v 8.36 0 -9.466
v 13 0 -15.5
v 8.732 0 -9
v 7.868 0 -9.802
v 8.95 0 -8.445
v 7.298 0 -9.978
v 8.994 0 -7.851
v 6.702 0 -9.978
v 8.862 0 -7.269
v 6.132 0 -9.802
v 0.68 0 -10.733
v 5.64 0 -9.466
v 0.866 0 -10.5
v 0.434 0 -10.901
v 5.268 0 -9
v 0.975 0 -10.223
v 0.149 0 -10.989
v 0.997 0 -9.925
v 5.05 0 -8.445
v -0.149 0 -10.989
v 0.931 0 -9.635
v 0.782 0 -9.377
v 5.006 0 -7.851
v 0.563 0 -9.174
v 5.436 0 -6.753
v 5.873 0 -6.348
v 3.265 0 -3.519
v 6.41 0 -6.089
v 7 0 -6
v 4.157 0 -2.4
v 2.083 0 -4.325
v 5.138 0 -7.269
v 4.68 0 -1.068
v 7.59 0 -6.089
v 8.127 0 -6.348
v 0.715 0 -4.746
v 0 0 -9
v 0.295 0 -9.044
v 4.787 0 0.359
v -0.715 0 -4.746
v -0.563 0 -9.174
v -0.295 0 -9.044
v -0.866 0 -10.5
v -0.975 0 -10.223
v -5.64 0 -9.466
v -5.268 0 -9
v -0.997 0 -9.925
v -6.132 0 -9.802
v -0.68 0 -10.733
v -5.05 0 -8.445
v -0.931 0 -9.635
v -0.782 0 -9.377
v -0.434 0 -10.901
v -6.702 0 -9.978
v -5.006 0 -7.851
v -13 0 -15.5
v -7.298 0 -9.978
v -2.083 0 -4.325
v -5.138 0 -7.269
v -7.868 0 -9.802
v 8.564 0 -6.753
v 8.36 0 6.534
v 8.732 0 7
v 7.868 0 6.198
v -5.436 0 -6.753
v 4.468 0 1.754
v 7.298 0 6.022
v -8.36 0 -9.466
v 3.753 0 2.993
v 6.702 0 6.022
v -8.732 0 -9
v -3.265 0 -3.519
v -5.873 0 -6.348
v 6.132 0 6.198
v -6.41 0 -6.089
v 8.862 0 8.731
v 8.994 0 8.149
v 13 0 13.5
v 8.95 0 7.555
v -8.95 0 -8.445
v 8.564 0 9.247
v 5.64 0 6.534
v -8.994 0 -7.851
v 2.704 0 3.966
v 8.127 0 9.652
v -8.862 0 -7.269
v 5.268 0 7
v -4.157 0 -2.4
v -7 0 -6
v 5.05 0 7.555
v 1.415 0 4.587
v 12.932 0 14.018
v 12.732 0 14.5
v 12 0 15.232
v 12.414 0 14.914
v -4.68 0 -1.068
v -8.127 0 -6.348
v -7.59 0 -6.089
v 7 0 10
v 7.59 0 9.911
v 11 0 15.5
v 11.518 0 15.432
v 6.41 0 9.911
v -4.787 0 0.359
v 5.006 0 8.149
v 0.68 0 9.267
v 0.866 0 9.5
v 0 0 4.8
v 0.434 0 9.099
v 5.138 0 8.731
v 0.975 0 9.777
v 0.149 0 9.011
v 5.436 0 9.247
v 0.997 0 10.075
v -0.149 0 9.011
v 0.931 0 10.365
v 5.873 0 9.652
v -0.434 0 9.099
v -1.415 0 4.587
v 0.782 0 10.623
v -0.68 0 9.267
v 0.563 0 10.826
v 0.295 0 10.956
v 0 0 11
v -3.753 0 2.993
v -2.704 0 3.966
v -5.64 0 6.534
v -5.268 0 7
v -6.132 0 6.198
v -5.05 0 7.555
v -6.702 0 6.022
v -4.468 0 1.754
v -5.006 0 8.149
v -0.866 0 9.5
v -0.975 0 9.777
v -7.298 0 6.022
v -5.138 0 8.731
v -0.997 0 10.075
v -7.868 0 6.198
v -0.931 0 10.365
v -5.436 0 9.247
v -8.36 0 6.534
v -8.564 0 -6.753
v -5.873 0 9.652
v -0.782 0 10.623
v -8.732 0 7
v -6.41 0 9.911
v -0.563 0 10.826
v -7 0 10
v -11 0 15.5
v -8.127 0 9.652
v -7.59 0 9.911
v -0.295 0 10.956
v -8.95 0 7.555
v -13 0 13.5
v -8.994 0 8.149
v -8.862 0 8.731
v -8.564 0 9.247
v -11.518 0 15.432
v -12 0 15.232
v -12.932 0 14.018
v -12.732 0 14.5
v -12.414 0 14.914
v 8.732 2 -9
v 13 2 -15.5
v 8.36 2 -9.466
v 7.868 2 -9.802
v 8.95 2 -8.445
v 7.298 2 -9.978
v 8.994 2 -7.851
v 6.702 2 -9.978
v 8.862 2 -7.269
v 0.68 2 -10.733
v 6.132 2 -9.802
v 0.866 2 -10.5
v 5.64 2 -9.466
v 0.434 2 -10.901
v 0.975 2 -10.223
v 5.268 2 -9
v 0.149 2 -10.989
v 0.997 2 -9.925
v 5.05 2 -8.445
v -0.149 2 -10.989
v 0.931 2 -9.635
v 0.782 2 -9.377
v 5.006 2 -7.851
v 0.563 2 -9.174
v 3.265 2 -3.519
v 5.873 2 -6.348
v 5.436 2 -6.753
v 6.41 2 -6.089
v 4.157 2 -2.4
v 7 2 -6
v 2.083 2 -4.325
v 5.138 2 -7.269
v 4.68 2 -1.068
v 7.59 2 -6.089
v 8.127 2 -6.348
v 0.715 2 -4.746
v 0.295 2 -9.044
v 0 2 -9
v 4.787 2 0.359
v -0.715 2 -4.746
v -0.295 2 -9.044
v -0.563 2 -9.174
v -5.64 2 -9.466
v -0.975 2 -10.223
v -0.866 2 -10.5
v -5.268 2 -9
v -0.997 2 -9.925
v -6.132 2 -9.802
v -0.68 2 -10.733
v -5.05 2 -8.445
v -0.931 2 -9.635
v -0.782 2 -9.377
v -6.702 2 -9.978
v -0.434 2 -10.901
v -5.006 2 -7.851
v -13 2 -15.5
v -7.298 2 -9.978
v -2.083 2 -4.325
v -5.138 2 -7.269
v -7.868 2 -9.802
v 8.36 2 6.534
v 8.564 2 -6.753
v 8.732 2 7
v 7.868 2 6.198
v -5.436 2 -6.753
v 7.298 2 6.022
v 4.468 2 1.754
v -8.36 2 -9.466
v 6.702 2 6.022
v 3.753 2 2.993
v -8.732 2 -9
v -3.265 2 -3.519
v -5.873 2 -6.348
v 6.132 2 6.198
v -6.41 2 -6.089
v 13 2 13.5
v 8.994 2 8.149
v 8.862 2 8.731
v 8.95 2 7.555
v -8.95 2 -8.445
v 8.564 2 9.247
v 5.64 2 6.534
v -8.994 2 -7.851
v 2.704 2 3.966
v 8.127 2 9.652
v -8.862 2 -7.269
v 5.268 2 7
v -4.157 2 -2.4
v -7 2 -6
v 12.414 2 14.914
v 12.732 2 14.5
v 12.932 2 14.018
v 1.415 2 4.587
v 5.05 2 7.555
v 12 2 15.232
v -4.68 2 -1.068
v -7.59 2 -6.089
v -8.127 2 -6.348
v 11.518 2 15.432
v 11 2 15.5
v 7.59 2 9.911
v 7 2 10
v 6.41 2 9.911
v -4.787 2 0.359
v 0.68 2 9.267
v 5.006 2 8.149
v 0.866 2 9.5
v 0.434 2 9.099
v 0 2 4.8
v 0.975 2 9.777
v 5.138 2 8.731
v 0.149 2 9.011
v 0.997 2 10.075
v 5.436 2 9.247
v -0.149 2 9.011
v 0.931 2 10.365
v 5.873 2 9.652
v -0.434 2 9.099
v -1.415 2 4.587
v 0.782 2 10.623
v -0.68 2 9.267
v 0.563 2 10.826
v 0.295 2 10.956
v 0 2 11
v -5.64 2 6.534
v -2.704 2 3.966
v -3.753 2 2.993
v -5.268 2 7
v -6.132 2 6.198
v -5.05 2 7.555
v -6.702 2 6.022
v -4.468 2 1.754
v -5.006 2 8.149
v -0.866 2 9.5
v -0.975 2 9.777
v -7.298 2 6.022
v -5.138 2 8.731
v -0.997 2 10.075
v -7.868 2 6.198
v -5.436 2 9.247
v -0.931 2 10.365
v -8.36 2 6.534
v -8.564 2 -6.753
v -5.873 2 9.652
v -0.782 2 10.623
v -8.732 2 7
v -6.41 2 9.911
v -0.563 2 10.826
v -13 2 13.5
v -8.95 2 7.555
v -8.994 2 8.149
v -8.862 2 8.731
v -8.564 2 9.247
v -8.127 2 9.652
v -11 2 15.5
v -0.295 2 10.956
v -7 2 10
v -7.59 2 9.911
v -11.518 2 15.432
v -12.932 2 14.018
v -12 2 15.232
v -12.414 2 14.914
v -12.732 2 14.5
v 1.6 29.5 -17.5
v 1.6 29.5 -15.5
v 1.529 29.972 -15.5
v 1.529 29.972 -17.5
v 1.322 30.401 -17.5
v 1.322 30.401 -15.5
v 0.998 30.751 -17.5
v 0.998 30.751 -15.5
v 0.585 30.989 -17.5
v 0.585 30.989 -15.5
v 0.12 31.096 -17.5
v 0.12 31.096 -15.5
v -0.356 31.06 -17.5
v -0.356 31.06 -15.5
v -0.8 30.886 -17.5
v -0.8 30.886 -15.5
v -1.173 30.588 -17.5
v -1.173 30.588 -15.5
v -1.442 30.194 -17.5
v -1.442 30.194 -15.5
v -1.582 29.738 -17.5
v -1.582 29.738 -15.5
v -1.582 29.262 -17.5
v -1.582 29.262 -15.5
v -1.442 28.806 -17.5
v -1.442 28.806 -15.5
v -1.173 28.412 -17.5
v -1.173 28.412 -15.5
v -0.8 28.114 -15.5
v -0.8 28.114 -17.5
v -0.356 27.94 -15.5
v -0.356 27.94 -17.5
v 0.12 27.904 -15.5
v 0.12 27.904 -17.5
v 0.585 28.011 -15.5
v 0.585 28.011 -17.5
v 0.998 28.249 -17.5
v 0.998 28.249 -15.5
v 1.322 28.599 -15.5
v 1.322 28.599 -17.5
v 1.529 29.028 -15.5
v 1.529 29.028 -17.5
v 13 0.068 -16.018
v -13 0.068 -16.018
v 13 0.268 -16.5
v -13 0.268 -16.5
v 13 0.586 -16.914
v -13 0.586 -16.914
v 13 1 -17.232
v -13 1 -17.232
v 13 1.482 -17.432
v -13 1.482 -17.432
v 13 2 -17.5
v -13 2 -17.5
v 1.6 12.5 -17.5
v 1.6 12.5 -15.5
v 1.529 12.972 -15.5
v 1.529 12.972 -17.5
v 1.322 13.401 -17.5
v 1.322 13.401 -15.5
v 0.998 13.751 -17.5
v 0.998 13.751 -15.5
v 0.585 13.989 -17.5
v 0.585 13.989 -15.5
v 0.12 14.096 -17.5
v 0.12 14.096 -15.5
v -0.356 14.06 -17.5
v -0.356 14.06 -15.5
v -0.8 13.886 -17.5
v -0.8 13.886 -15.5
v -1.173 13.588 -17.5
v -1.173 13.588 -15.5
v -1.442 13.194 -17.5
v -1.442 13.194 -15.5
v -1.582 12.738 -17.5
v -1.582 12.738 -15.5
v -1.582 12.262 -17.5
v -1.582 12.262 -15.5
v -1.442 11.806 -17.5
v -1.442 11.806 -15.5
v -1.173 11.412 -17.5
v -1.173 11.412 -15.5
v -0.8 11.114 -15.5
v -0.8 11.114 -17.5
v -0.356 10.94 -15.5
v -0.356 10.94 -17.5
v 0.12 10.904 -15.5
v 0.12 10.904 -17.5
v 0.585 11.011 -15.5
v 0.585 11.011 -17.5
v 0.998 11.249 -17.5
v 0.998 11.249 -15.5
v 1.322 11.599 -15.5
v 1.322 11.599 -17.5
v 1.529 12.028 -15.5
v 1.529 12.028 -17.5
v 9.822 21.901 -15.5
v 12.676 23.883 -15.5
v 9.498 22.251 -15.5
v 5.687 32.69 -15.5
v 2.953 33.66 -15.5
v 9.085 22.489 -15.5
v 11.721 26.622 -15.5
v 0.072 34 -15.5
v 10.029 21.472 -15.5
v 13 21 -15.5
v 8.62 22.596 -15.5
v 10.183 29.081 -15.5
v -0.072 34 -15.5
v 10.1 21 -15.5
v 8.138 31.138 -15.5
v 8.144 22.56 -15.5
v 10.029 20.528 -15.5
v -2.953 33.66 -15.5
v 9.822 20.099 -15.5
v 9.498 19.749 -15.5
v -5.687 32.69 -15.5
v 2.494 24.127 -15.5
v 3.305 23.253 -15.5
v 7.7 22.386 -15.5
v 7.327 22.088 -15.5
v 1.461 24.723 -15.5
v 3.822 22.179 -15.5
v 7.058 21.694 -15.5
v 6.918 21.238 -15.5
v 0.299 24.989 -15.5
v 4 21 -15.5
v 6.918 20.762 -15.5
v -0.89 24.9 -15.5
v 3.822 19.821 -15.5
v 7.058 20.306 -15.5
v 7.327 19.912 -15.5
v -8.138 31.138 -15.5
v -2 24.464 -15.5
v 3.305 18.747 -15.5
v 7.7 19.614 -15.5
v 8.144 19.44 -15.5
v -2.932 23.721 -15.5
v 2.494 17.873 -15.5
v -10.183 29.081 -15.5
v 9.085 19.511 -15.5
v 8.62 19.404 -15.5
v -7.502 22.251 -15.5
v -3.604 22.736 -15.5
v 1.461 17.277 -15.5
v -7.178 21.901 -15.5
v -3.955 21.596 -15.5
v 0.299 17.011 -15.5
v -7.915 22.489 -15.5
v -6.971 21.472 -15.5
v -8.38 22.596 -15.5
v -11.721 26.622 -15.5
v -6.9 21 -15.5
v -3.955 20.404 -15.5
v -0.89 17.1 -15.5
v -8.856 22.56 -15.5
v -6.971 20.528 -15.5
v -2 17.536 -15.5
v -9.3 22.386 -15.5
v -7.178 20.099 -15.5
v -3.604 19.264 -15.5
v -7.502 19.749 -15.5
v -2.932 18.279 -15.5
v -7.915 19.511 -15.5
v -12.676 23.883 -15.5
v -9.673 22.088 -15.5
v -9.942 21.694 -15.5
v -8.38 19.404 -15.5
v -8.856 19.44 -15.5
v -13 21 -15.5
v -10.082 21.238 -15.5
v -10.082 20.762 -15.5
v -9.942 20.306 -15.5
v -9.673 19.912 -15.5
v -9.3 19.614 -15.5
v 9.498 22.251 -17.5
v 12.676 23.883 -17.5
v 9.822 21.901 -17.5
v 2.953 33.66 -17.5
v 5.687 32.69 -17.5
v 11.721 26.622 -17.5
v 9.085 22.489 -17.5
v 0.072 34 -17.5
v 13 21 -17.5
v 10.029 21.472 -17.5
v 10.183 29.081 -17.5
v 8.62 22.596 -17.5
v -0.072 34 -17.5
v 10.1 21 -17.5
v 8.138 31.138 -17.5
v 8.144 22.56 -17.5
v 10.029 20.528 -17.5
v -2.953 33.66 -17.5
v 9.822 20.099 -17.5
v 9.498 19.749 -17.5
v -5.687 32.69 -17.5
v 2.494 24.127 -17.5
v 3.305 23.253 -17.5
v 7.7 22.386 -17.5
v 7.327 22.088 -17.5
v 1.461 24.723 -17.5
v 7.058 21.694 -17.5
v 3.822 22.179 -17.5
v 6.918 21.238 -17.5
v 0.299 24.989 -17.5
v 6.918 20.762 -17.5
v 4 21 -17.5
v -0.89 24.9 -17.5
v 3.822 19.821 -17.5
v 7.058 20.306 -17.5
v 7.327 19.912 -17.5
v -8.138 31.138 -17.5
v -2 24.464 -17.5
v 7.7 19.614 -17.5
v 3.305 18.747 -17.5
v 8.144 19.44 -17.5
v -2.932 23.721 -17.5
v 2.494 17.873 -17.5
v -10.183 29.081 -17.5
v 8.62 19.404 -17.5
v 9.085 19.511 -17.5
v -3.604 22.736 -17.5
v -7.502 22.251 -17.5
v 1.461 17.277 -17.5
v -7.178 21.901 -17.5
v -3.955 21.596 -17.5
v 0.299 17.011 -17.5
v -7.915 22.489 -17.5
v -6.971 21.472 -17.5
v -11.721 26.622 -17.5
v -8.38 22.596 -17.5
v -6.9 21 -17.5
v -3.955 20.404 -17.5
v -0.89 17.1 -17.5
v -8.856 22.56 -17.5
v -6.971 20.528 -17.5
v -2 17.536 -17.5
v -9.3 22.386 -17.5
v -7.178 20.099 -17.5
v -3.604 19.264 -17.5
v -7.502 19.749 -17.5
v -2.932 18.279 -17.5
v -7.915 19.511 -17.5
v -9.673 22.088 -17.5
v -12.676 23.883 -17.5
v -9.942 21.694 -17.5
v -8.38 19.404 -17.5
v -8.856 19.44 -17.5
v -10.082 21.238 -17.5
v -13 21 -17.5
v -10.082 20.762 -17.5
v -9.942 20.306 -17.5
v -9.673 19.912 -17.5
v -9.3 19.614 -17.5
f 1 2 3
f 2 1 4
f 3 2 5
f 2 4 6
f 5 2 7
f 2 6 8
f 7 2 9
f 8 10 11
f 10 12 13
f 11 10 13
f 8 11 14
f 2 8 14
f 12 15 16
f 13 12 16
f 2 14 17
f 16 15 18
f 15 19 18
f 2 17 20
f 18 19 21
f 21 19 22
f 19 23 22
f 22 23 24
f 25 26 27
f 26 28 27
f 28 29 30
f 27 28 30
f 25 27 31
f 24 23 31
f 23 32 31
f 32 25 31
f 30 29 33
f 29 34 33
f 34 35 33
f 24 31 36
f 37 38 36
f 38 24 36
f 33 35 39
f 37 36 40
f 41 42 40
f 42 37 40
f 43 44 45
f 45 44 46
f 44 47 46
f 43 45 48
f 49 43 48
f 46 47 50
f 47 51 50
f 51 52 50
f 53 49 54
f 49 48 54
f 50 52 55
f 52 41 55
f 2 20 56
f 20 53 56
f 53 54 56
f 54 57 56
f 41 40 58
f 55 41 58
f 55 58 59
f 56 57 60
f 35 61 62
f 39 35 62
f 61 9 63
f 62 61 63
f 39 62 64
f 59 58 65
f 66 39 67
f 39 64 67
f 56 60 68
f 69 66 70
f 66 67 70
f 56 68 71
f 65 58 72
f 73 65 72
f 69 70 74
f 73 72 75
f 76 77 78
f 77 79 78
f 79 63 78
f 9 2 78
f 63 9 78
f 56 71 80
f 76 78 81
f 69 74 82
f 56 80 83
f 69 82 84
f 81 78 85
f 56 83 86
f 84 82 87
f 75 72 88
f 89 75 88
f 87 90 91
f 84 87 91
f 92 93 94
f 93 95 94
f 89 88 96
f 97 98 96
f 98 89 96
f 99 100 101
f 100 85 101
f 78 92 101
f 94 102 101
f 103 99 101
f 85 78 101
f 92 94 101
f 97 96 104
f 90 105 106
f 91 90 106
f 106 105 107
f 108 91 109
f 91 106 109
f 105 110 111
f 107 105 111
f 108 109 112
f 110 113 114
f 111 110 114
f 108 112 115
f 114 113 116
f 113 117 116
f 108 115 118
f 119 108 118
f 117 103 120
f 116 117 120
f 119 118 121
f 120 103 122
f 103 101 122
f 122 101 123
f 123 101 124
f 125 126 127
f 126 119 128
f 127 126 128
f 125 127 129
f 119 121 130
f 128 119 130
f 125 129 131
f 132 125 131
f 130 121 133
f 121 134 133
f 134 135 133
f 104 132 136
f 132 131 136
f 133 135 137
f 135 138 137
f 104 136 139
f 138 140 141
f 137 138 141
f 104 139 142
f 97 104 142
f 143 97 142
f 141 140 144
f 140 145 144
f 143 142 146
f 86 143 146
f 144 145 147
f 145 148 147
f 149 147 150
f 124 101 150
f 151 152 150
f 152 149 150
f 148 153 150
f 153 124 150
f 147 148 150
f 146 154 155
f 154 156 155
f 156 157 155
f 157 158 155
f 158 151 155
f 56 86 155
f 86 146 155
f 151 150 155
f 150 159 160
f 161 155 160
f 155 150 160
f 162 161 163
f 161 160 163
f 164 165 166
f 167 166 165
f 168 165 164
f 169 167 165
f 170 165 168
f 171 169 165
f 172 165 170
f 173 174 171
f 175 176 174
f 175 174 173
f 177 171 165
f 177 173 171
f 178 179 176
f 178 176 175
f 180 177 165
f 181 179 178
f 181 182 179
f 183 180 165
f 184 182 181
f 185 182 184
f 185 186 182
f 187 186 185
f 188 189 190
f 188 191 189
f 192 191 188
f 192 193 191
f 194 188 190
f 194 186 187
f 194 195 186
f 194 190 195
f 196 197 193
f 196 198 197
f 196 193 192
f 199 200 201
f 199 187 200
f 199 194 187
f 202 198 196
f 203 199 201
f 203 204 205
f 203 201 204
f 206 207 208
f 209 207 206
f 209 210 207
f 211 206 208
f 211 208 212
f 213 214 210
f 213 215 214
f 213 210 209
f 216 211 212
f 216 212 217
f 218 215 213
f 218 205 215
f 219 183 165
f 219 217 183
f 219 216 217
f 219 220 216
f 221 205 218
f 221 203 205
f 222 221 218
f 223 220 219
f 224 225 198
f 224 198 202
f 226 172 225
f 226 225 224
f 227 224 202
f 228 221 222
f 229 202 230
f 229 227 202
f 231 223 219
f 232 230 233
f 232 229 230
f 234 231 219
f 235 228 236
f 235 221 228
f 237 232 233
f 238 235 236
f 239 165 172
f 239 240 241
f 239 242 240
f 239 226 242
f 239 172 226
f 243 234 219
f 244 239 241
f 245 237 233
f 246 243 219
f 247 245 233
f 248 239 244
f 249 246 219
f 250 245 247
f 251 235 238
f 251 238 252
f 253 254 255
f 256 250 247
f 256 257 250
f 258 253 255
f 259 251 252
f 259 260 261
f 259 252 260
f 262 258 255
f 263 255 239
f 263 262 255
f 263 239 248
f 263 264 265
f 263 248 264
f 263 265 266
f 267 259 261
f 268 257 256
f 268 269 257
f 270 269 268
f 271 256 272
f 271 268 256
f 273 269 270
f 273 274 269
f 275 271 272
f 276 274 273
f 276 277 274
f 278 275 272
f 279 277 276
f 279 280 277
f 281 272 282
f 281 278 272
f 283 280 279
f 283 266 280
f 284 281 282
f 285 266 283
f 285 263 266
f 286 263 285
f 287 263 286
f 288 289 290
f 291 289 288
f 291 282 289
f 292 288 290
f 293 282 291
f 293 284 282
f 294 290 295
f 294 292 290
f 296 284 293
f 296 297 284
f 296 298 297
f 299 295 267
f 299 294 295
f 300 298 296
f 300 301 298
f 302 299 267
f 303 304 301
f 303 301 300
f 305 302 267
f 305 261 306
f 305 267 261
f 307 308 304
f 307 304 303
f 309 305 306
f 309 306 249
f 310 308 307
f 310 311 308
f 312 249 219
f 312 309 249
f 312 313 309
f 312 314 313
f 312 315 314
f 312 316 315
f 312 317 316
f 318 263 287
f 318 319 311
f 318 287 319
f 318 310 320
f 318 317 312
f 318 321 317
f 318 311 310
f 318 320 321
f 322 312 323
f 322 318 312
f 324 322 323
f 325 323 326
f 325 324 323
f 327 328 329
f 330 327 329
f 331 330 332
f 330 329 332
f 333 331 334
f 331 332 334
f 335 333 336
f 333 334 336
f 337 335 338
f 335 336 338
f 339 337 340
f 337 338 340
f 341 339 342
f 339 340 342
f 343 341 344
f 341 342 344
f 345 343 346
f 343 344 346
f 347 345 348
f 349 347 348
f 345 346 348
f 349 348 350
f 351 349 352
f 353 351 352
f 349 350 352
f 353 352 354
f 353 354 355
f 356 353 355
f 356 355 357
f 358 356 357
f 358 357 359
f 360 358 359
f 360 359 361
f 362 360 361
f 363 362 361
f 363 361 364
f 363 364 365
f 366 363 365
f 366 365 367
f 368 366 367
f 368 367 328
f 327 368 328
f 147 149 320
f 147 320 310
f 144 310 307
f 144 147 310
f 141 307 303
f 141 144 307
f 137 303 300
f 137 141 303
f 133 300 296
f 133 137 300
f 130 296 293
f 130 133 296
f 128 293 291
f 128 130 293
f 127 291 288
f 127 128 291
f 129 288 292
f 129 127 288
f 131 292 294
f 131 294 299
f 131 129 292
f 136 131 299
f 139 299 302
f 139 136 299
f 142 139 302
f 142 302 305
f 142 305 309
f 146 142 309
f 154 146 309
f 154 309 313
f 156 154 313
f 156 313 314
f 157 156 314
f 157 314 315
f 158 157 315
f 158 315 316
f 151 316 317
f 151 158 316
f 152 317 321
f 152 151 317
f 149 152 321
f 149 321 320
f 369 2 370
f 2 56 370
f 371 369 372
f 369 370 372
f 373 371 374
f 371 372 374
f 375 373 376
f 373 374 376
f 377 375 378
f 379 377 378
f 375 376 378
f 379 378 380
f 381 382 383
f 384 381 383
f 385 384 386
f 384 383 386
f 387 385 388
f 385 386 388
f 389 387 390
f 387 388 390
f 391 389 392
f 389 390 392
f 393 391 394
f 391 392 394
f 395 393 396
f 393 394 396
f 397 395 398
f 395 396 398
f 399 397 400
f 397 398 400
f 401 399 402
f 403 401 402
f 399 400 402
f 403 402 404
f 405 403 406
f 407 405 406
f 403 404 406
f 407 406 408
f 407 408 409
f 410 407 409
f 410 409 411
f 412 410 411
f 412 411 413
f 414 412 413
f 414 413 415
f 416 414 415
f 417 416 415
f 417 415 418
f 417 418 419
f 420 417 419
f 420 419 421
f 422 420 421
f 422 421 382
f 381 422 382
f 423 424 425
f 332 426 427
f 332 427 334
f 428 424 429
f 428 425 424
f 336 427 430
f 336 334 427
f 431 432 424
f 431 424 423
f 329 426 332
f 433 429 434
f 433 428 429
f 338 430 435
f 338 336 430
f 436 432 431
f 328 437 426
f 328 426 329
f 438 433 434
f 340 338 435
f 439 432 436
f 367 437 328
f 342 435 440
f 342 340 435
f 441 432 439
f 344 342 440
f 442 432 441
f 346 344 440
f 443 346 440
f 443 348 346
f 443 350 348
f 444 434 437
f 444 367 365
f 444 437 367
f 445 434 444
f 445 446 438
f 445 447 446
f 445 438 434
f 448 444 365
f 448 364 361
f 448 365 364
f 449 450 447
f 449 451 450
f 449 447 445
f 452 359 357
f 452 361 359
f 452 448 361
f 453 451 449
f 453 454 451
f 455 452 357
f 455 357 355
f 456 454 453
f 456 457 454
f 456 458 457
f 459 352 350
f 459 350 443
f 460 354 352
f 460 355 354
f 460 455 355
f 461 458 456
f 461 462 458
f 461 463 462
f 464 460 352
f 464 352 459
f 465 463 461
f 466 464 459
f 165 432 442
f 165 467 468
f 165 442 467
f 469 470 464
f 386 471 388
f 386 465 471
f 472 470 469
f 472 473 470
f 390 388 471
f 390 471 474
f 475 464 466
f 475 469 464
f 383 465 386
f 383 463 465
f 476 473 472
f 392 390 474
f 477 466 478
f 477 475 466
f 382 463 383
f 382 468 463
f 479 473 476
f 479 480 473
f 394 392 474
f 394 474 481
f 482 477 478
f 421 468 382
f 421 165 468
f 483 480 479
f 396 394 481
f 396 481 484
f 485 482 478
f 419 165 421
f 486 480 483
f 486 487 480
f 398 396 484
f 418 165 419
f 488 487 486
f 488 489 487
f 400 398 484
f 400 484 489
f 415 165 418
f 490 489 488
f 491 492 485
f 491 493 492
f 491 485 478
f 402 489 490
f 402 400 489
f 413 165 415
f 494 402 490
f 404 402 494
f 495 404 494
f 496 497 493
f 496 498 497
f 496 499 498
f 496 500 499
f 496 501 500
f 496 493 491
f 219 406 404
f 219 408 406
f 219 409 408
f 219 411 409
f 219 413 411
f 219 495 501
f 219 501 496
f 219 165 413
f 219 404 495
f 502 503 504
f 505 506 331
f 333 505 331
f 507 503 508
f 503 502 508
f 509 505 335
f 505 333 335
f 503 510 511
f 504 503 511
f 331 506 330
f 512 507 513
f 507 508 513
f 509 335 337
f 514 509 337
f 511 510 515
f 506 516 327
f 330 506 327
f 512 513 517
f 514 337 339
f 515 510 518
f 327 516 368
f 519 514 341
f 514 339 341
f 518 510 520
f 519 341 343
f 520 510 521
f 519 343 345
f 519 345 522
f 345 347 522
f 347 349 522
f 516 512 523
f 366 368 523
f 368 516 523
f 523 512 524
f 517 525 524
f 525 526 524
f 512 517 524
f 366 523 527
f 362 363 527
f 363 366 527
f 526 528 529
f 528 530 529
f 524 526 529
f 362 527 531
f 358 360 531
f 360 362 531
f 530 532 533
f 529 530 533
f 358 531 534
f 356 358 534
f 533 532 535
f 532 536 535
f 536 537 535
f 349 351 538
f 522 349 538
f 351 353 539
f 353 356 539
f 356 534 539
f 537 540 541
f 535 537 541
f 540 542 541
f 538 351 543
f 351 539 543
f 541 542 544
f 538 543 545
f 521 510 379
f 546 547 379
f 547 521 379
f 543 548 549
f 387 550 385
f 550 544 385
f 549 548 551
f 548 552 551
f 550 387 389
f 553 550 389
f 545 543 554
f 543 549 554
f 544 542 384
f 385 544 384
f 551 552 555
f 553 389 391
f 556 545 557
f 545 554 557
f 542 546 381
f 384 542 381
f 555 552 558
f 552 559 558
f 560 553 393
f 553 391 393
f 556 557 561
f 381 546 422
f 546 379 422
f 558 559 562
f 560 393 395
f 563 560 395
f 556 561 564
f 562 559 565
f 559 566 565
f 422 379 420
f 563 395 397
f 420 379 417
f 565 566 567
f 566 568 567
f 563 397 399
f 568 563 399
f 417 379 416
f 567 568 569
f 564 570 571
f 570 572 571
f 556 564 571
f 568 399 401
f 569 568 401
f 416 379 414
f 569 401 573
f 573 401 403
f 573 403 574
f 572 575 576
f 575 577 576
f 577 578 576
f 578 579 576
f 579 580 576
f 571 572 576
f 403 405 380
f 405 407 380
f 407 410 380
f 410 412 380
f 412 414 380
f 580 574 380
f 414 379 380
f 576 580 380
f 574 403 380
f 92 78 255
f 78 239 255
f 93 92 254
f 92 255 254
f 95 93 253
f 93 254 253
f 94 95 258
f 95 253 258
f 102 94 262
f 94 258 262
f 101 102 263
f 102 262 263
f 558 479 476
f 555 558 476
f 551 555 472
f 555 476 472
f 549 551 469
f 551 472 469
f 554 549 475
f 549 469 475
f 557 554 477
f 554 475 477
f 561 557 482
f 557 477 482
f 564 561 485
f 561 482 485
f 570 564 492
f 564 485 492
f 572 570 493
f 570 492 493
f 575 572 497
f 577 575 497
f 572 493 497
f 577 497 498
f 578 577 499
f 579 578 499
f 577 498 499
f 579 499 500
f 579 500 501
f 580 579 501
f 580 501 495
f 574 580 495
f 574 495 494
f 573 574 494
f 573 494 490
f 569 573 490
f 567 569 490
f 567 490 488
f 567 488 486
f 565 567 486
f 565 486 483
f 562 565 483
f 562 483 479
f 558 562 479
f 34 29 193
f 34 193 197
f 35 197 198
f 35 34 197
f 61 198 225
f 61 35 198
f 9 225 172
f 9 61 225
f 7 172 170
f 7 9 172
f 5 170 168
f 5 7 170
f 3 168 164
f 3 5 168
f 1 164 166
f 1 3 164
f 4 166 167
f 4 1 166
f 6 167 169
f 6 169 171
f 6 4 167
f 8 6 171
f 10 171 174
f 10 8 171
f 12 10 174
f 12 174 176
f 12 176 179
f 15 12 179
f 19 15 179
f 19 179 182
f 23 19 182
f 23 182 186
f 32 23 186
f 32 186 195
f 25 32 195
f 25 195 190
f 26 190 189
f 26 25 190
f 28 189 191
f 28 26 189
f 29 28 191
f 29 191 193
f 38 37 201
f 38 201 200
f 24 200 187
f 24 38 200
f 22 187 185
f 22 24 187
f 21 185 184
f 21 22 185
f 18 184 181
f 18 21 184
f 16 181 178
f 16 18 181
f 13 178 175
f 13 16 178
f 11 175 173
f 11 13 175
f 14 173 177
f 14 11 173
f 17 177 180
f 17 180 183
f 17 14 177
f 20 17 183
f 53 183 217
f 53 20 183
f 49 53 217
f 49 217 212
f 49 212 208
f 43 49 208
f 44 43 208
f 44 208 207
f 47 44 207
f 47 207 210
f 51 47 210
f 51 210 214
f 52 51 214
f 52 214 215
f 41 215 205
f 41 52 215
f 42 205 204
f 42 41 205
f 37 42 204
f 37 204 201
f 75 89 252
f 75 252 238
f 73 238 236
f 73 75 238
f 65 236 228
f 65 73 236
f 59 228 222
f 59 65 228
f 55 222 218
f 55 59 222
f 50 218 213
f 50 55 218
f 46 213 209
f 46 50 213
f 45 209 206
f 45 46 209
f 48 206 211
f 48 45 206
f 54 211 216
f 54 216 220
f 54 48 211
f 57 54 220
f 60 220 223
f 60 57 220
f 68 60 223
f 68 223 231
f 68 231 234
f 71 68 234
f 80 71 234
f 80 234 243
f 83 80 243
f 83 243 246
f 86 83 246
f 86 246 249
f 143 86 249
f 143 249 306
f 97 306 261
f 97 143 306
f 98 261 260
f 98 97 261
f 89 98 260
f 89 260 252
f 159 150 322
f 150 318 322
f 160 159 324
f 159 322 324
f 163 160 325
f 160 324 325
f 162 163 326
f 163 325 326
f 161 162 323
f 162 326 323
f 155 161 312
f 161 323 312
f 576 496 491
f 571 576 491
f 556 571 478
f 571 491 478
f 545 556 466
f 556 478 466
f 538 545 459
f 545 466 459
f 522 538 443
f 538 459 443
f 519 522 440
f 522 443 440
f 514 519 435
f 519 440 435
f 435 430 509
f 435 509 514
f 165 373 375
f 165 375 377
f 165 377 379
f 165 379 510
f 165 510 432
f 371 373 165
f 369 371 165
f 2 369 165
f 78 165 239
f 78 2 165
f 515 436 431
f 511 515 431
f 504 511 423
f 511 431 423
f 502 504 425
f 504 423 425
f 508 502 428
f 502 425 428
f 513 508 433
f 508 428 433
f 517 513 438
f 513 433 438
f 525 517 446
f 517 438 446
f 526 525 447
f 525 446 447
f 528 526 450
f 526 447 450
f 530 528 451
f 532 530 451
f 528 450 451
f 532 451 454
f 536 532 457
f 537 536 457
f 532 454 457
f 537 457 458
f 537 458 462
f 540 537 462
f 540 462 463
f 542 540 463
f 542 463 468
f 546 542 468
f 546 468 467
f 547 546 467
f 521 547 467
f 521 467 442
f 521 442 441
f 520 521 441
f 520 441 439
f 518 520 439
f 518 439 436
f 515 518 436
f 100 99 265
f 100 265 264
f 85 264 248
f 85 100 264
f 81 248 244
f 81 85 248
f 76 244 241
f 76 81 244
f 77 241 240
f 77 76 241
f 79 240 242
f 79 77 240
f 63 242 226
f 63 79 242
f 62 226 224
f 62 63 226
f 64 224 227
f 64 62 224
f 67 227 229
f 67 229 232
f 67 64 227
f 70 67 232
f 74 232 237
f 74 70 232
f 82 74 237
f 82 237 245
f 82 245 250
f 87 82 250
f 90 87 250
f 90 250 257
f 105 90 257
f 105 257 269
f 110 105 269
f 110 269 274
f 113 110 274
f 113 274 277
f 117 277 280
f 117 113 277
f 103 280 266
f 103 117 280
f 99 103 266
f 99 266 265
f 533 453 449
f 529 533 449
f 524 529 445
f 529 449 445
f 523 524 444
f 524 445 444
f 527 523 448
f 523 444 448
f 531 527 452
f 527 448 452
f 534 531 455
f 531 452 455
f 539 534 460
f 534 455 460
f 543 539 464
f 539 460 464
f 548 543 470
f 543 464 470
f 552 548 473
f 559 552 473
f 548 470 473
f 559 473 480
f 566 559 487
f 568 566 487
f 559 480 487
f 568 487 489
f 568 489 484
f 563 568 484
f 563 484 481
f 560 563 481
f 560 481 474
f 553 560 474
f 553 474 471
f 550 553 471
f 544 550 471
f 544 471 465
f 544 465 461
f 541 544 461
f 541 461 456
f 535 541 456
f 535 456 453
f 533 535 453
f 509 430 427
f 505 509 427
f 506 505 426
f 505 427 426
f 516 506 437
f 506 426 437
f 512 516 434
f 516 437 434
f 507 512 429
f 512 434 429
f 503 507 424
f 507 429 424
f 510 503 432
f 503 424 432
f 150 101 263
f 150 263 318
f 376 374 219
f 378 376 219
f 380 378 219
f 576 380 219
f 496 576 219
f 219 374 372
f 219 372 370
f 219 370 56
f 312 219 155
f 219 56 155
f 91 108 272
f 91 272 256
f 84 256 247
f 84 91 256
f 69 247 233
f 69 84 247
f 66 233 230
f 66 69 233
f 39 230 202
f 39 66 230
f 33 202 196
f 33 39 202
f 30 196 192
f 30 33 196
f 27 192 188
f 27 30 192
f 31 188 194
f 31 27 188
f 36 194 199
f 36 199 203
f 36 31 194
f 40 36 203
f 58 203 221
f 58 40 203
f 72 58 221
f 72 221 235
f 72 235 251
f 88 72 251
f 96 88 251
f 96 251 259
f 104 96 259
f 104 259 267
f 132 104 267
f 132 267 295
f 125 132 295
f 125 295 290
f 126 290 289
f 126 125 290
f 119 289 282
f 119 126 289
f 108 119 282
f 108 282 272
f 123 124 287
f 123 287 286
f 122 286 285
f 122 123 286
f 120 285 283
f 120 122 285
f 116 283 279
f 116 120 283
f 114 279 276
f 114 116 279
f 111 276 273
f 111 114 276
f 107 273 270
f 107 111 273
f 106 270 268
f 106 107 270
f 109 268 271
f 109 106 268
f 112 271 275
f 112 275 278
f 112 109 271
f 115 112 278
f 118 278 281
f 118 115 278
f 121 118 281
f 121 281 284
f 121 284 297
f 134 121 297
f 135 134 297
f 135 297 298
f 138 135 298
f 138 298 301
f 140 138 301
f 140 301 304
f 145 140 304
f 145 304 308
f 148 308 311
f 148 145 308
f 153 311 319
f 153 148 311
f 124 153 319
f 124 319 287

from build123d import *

# Parameters (mm, degrees)
SKETCH1_W        = 26
SKETCH1_H        = 31
SKETCH1_R        = 4.8
SKETCH1_R_2      = 2
SKETCH1_R_3      = 1
EXTRUSION1_DEPTH = 2
SKETCH2_W        = 26
SKETCH2_H        = 2
EXTRUSION2_DEPTH = 34
SKETCH3_R        = 1.6
SKETCH3_R_2      = 4
SKETCH3_R_3      = 0.0001
EXTRUSION3_DEPTH = 34
FILLET1_R        = 2
FILLET2_R        = 2


with BuildPart() as part:
    # Sketch1 → Extrusion1 (new body)
    with BuildSketch(Plane(origin=(0, 0, 0), x_dir=(-1, 0, 0), z_dir=(0, 1, 0))):
        Rectangle(SKETCH1_W, SKETCH1_H)
        with Locations(Location((0, 0, 0), (0, 0, 90))):
            Circle(SKETCH1_R, mode=Mode.SUBTRACT)
        with Locations(Location((7, 8, 0), (0, 0, 90))):
            Circle(SKETCH1_R_2, mode=Mode.SUBTRACT)
        with Locations(Location((7, -8, 0), (0, 0, 90))):
            Circle(SKETCH1_R_2, mode=Mode.SUBTRACT)
        with Locations(Location((-7, -8, 0), (0, 0, 90))):
            Circle(SKETCH1_R_2, mode=Mode.SUBTRACT)
        with Locations(Location((-7, 8, 0), (0, 0, 90))):
            Circle(SKETCH1_R_2, mode=Mode.SUBTRACT)
        with Locations(Location((0, 10, 0), (0, 0, 90))):
            Circle(SKETCH1_R_3, mode=Mode.SUBTRACT)
        with Locations(Location((0, -10, 0), (0, 0, 90))):
            Circle(SKETCH1_R_3, mode=Mode.SUBTRACT)
    extrude(amount=EXTRUSION1_DEPTH)

    # Sketch2 → Extrusion2 (add)
    with BuildSketch(Plane(origin=(0, 0, 0), x_dir=(-1, 0, 0), z_dir=(0, 1, 0))):
        with Locations((0, -16.5)):
            Rectangle(SKETCH2_W, SKETCH2_H)
    extrude(amount=EXTRUSION2_DEPTH)

    # Sketch3 → Extrusion3 (cut)
    with BuildSketch(Plane.XY.offset(-15.5)):
        with Locations((0, 29.5)):
            Circle(SKETCH3_R)
        with Locations((8.5, 21)):
            Circle(SKETCH3_R)
        with Locations((0, 12.5)):
            Circle(SKETCH3_R)
        with Locations((-8.5, 21)):
            Circle(SKETCH3_R)
        with Locations((0, 21)):
            Circle(SKETCH3_R_2)
        with Locations((-0.072111026, 33.9999)):
            Circle(SKETCH3_R_3)
        with Locations((0.072111026, 33.9999)):
            Circle(SKETCH3_R_3)
        with BuildLine():
            Line((-0.072111026, 34), (-13, 34))
            Line((-13, 34), (-13, 21))
            ThreePointArc((-13, 21), (-9.2178478, 30.166857801), (-0.072111026, 34))
        make_face()
        with BuildLine():
            Line((13, 21), (13, 34))
            Line((13, 34), (0.072111026, 34))
            ThreePointArc((0.072111026, 34), (9.2178478, 30.166857801), (13, 21))
        make_face()
    extrude(amount=-EXTRUSION3_DEPTH, mode=Mode.SUBTRACT)

    # Fillet1
    fillet1_edges = [part.edges().sort_by_distance(p)[0] for p in [
        (0, 0, -17.5),
    ]]
    fillet(fillet1_edges, radius=FILLET1_R)

    # Fillet2
    fillet2_edges = [part.edges().sort_by_distance(p)[0] for p in [
        (-13, 1, 15.5),
        (13, 1, 15.5),
    ]]
    fillet(fillet2_edges, radius=FILLET2_R)


solid = part.part
